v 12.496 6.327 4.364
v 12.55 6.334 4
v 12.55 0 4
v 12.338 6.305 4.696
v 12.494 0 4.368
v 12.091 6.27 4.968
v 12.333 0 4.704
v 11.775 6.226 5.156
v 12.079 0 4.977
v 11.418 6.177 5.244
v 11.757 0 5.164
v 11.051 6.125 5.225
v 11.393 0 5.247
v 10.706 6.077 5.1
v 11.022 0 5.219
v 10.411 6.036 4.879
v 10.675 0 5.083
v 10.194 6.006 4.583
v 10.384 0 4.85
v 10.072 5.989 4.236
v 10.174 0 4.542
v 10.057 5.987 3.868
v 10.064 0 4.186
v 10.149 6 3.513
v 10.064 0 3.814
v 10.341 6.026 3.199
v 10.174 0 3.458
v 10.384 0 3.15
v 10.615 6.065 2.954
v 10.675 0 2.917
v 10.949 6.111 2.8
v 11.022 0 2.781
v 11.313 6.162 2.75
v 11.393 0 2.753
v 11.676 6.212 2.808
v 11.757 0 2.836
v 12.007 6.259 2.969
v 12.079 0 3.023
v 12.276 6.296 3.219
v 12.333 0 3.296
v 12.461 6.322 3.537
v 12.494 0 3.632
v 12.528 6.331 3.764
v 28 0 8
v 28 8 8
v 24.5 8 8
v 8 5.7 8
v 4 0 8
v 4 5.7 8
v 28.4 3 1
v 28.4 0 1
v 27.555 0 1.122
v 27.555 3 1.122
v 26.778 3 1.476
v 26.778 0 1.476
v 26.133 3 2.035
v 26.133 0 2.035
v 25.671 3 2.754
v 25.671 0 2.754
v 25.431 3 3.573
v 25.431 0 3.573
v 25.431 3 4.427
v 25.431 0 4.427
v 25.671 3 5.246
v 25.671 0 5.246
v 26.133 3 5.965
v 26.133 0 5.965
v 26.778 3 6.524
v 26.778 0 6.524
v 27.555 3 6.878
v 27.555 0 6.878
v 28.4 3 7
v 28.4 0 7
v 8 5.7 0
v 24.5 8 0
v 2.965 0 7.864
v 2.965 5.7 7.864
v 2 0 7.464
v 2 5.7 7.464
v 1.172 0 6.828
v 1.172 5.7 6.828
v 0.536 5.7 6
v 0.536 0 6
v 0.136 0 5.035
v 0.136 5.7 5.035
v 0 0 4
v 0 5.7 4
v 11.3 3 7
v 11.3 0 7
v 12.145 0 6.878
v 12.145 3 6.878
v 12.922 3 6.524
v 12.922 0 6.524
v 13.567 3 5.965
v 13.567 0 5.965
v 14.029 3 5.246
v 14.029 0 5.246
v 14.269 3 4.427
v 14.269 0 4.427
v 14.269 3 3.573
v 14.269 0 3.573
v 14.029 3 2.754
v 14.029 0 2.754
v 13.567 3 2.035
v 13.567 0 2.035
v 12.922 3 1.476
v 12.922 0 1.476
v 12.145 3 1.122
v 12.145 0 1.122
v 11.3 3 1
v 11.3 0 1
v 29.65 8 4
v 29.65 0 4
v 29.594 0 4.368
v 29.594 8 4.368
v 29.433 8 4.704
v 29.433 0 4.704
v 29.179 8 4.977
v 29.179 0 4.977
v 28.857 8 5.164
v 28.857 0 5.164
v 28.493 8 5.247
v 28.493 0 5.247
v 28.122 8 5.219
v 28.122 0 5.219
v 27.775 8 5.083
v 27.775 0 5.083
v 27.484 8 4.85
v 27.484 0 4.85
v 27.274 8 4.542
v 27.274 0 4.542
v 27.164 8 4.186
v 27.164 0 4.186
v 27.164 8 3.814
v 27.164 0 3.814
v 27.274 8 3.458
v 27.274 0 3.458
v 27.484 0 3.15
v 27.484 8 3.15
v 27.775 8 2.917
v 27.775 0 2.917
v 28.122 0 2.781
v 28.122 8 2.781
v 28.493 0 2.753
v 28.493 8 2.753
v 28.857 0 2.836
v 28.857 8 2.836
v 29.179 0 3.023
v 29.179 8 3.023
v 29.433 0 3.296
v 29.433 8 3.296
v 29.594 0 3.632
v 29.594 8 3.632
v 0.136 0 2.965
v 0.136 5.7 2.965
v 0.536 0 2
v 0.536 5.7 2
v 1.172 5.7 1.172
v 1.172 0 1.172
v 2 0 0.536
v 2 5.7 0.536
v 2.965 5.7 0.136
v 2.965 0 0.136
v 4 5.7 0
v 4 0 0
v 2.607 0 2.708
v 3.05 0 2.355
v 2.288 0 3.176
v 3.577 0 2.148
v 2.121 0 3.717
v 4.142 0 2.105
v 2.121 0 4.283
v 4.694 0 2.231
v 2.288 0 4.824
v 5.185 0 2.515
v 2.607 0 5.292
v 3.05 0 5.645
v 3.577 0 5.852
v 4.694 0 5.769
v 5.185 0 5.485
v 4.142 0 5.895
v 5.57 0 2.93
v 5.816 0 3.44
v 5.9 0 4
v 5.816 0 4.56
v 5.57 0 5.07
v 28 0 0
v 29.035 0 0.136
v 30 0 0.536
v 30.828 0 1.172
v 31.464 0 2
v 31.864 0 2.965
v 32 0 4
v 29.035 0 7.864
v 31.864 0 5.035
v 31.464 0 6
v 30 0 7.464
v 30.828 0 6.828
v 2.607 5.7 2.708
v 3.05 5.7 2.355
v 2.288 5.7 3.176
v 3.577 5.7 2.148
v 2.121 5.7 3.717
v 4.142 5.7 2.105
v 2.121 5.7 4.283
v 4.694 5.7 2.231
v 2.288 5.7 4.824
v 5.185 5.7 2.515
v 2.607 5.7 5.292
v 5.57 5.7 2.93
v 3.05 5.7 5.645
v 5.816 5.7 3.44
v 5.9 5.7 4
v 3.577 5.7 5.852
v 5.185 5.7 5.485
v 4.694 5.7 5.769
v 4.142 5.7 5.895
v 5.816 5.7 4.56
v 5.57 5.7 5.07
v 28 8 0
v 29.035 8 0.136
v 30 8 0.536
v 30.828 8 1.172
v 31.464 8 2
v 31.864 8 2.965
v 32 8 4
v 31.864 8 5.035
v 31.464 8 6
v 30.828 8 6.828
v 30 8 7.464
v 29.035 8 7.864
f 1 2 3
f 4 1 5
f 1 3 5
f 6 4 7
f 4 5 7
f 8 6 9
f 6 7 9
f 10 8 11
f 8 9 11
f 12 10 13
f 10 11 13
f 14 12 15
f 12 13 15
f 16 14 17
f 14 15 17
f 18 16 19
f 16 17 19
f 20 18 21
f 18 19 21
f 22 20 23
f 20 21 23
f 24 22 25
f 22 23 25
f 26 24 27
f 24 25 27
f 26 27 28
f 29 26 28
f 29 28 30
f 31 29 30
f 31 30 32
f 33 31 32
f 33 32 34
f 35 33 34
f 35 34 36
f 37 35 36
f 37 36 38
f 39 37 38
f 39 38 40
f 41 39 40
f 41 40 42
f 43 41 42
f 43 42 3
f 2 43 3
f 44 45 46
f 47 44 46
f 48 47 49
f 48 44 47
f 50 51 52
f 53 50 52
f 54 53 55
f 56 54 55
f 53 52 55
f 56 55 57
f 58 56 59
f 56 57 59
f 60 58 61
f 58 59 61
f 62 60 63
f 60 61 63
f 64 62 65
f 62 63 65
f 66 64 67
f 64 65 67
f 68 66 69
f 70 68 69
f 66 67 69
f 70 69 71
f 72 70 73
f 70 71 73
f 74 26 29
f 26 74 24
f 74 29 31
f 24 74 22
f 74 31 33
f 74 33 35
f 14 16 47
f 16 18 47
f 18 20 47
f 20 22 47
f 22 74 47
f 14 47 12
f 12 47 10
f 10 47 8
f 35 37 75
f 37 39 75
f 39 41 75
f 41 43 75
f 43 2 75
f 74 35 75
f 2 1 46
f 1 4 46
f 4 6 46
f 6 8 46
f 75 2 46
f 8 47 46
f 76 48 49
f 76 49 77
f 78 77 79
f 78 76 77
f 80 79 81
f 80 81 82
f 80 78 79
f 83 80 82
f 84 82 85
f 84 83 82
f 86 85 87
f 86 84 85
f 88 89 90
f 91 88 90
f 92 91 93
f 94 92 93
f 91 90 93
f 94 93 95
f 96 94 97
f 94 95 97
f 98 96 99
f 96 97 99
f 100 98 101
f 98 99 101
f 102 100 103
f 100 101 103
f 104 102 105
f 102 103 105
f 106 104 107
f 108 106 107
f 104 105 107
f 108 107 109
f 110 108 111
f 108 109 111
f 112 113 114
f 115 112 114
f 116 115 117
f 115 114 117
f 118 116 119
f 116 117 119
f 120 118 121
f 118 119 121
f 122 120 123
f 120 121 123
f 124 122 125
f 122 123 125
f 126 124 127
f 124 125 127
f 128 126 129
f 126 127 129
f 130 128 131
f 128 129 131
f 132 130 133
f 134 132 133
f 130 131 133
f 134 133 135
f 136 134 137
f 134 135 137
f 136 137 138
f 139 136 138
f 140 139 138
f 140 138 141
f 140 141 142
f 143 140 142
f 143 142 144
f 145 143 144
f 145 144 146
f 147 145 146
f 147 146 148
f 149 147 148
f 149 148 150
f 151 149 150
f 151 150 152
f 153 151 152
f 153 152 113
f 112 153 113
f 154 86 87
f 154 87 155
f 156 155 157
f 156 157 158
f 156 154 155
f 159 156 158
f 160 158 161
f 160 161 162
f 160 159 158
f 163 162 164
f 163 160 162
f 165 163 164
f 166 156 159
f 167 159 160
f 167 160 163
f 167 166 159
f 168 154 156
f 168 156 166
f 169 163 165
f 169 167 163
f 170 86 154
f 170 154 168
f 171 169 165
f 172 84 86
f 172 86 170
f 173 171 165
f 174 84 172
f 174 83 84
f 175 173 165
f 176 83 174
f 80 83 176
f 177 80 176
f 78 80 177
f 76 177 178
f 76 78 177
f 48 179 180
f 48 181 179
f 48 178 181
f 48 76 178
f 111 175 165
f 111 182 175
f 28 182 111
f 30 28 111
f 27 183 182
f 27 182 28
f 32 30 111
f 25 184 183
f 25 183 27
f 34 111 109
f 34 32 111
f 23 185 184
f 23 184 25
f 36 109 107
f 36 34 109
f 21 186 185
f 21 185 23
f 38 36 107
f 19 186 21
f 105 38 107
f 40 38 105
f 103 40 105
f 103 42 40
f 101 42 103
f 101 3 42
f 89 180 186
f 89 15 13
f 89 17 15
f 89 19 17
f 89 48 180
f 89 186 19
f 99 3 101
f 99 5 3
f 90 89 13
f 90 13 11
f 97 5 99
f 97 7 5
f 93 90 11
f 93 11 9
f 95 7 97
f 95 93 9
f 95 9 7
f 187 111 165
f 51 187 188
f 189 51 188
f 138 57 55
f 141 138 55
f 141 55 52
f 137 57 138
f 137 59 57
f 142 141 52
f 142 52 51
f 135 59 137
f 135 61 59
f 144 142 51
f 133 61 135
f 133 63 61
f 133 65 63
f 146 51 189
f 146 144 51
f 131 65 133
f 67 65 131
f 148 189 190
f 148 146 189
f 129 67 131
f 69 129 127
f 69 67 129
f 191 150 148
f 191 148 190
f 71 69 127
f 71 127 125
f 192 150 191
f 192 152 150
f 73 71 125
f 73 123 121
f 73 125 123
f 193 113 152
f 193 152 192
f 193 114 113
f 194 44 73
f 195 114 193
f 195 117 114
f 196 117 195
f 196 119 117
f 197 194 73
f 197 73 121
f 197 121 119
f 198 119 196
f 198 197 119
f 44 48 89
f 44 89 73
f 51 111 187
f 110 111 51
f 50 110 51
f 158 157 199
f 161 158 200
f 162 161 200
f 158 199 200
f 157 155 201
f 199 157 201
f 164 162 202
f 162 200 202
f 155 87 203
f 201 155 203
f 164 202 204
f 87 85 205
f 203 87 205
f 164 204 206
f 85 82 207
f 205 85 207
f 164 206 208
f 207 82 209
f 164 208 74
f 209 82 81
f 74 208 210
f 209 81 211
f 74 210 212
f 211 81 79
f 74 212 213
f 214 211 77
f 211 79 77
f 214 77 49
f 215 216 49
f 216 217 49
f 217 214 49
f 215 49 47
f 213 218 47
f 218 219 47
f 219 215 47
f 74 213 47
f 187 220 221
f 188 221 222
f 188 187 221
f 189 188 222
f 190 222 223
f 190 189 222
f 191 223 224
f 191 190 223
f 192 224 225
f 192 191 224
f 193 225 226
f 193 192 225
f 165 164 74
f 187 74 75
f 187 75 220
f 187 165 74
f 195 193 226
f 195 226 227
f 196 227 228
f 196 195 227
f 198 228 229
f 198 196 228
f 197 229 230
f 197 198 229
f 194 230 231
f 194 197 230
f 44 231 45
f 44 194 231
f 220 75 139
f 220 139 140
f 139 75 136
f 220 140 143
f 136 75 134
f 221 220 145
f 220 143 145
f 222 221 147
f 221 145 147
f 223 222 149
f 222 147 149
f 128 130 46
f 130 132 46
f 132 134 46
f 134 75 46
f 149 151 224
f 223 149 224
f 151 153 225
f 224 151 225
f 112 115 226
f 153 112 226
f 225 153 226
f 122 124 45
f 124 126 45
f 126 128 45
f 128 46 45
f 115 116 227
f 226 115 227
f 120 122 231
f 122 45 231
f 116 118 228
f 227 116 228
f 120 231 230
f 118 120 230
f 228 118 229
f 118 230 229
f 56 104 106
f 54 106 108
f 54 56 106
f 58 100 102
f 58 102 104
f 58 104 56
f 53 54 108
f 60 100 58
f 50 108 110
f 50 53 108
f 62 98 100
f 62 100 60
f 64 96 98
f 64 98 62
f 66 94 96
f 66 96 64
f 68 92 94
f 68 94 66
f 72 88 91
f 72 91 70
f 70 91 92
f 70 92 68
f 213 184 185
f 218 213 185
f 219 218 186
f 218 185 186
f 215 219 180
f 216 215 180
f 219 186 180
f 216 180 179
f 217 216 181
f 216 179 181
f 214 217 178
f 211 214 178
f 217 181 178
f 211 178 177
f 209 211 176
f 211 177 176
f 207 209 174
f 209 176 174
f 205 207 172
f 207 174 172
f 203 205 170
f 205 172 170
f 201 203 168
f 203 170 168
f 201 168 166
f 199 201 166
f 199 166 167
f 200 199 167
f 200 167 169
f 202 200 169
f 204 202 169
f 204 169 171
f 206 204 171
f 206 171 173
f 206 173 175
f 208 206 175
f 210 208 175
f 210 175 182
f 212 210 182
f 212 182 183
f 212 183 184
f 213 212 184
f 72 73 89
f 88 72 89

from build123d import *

# Parameters (mm, degrees)
F1_DEPTH = 8
F2_R     = 1.9
F2_R_2   = 1.25
F3_DEPTH = 25
F4_W     = 4
F4_H     = 2.3
F5_DEPTH = 25
F7_DEPTH = 3


with BuildPart() as f1:
    # F0 (on Front) → F1 (new body)
    with BuildSketch(Plane.XZ):
        with BuildLine():
            ThreePointArc((0, 4), (1.171573, 1.171573), (4, 0))
            Line((4, 0), (28, 0))
            ThreePointArc((28, 0), (30.828427, 1.171573), (32, 4))
            ThreePointArc((32, 4), (30.828427, 6.828427), (28, 8))
            Line((28, 8), (4, 8))
            ThreePointArc((4, 8), (1.171573, 6.828427), (0, 4))
        make_face()
    extrude(amount=-F1_DEPTH)

    # F2 (on face) → F3 (cut)
    with BuildSketch(Plane.XZ):
        with Locations((4, 4)):
            Circle(F2_R)
        with Locations((11.3, 4)):
            Circle(F2_R_2)
        with Locations((28.4, 4)):
            Circle(F2_R_2)
    extrude(amount=-F3_DEPTH, mode=Mode.SUBTRACT)

    # F4 (on face) → F5 (cut)
    with BuildSketch(Plane.XY.offset(8)):
        Polygon((4, 8), (4, 5.7), (8, 5.7), (24.5, 8), align=None)
        with Locations((2, 6.85)):
            Rectangle(F4_W, F4_H)
    extrude(amount=-F5_DEPTH, mode=Mode.SUBTRACT)

    # F6 (on face) → F7 (cut)
    with BuildSketch(Plane.XZ):
        with BuildLine():
            ThreePointArc((11.3, 7), (14.3, 4), (11.3, 1))
            Line((11.3, 1), (28.4, 1))
            ThreePointArc((28.4, 1), (25.4, 4), (28.4, 7))
            Line((28.4, 7), (11.3, 7))
        make_face()
    extrude(amount=-F7_DEPTH, mode=Mode.SUBTRACT)


solid = f1.part
